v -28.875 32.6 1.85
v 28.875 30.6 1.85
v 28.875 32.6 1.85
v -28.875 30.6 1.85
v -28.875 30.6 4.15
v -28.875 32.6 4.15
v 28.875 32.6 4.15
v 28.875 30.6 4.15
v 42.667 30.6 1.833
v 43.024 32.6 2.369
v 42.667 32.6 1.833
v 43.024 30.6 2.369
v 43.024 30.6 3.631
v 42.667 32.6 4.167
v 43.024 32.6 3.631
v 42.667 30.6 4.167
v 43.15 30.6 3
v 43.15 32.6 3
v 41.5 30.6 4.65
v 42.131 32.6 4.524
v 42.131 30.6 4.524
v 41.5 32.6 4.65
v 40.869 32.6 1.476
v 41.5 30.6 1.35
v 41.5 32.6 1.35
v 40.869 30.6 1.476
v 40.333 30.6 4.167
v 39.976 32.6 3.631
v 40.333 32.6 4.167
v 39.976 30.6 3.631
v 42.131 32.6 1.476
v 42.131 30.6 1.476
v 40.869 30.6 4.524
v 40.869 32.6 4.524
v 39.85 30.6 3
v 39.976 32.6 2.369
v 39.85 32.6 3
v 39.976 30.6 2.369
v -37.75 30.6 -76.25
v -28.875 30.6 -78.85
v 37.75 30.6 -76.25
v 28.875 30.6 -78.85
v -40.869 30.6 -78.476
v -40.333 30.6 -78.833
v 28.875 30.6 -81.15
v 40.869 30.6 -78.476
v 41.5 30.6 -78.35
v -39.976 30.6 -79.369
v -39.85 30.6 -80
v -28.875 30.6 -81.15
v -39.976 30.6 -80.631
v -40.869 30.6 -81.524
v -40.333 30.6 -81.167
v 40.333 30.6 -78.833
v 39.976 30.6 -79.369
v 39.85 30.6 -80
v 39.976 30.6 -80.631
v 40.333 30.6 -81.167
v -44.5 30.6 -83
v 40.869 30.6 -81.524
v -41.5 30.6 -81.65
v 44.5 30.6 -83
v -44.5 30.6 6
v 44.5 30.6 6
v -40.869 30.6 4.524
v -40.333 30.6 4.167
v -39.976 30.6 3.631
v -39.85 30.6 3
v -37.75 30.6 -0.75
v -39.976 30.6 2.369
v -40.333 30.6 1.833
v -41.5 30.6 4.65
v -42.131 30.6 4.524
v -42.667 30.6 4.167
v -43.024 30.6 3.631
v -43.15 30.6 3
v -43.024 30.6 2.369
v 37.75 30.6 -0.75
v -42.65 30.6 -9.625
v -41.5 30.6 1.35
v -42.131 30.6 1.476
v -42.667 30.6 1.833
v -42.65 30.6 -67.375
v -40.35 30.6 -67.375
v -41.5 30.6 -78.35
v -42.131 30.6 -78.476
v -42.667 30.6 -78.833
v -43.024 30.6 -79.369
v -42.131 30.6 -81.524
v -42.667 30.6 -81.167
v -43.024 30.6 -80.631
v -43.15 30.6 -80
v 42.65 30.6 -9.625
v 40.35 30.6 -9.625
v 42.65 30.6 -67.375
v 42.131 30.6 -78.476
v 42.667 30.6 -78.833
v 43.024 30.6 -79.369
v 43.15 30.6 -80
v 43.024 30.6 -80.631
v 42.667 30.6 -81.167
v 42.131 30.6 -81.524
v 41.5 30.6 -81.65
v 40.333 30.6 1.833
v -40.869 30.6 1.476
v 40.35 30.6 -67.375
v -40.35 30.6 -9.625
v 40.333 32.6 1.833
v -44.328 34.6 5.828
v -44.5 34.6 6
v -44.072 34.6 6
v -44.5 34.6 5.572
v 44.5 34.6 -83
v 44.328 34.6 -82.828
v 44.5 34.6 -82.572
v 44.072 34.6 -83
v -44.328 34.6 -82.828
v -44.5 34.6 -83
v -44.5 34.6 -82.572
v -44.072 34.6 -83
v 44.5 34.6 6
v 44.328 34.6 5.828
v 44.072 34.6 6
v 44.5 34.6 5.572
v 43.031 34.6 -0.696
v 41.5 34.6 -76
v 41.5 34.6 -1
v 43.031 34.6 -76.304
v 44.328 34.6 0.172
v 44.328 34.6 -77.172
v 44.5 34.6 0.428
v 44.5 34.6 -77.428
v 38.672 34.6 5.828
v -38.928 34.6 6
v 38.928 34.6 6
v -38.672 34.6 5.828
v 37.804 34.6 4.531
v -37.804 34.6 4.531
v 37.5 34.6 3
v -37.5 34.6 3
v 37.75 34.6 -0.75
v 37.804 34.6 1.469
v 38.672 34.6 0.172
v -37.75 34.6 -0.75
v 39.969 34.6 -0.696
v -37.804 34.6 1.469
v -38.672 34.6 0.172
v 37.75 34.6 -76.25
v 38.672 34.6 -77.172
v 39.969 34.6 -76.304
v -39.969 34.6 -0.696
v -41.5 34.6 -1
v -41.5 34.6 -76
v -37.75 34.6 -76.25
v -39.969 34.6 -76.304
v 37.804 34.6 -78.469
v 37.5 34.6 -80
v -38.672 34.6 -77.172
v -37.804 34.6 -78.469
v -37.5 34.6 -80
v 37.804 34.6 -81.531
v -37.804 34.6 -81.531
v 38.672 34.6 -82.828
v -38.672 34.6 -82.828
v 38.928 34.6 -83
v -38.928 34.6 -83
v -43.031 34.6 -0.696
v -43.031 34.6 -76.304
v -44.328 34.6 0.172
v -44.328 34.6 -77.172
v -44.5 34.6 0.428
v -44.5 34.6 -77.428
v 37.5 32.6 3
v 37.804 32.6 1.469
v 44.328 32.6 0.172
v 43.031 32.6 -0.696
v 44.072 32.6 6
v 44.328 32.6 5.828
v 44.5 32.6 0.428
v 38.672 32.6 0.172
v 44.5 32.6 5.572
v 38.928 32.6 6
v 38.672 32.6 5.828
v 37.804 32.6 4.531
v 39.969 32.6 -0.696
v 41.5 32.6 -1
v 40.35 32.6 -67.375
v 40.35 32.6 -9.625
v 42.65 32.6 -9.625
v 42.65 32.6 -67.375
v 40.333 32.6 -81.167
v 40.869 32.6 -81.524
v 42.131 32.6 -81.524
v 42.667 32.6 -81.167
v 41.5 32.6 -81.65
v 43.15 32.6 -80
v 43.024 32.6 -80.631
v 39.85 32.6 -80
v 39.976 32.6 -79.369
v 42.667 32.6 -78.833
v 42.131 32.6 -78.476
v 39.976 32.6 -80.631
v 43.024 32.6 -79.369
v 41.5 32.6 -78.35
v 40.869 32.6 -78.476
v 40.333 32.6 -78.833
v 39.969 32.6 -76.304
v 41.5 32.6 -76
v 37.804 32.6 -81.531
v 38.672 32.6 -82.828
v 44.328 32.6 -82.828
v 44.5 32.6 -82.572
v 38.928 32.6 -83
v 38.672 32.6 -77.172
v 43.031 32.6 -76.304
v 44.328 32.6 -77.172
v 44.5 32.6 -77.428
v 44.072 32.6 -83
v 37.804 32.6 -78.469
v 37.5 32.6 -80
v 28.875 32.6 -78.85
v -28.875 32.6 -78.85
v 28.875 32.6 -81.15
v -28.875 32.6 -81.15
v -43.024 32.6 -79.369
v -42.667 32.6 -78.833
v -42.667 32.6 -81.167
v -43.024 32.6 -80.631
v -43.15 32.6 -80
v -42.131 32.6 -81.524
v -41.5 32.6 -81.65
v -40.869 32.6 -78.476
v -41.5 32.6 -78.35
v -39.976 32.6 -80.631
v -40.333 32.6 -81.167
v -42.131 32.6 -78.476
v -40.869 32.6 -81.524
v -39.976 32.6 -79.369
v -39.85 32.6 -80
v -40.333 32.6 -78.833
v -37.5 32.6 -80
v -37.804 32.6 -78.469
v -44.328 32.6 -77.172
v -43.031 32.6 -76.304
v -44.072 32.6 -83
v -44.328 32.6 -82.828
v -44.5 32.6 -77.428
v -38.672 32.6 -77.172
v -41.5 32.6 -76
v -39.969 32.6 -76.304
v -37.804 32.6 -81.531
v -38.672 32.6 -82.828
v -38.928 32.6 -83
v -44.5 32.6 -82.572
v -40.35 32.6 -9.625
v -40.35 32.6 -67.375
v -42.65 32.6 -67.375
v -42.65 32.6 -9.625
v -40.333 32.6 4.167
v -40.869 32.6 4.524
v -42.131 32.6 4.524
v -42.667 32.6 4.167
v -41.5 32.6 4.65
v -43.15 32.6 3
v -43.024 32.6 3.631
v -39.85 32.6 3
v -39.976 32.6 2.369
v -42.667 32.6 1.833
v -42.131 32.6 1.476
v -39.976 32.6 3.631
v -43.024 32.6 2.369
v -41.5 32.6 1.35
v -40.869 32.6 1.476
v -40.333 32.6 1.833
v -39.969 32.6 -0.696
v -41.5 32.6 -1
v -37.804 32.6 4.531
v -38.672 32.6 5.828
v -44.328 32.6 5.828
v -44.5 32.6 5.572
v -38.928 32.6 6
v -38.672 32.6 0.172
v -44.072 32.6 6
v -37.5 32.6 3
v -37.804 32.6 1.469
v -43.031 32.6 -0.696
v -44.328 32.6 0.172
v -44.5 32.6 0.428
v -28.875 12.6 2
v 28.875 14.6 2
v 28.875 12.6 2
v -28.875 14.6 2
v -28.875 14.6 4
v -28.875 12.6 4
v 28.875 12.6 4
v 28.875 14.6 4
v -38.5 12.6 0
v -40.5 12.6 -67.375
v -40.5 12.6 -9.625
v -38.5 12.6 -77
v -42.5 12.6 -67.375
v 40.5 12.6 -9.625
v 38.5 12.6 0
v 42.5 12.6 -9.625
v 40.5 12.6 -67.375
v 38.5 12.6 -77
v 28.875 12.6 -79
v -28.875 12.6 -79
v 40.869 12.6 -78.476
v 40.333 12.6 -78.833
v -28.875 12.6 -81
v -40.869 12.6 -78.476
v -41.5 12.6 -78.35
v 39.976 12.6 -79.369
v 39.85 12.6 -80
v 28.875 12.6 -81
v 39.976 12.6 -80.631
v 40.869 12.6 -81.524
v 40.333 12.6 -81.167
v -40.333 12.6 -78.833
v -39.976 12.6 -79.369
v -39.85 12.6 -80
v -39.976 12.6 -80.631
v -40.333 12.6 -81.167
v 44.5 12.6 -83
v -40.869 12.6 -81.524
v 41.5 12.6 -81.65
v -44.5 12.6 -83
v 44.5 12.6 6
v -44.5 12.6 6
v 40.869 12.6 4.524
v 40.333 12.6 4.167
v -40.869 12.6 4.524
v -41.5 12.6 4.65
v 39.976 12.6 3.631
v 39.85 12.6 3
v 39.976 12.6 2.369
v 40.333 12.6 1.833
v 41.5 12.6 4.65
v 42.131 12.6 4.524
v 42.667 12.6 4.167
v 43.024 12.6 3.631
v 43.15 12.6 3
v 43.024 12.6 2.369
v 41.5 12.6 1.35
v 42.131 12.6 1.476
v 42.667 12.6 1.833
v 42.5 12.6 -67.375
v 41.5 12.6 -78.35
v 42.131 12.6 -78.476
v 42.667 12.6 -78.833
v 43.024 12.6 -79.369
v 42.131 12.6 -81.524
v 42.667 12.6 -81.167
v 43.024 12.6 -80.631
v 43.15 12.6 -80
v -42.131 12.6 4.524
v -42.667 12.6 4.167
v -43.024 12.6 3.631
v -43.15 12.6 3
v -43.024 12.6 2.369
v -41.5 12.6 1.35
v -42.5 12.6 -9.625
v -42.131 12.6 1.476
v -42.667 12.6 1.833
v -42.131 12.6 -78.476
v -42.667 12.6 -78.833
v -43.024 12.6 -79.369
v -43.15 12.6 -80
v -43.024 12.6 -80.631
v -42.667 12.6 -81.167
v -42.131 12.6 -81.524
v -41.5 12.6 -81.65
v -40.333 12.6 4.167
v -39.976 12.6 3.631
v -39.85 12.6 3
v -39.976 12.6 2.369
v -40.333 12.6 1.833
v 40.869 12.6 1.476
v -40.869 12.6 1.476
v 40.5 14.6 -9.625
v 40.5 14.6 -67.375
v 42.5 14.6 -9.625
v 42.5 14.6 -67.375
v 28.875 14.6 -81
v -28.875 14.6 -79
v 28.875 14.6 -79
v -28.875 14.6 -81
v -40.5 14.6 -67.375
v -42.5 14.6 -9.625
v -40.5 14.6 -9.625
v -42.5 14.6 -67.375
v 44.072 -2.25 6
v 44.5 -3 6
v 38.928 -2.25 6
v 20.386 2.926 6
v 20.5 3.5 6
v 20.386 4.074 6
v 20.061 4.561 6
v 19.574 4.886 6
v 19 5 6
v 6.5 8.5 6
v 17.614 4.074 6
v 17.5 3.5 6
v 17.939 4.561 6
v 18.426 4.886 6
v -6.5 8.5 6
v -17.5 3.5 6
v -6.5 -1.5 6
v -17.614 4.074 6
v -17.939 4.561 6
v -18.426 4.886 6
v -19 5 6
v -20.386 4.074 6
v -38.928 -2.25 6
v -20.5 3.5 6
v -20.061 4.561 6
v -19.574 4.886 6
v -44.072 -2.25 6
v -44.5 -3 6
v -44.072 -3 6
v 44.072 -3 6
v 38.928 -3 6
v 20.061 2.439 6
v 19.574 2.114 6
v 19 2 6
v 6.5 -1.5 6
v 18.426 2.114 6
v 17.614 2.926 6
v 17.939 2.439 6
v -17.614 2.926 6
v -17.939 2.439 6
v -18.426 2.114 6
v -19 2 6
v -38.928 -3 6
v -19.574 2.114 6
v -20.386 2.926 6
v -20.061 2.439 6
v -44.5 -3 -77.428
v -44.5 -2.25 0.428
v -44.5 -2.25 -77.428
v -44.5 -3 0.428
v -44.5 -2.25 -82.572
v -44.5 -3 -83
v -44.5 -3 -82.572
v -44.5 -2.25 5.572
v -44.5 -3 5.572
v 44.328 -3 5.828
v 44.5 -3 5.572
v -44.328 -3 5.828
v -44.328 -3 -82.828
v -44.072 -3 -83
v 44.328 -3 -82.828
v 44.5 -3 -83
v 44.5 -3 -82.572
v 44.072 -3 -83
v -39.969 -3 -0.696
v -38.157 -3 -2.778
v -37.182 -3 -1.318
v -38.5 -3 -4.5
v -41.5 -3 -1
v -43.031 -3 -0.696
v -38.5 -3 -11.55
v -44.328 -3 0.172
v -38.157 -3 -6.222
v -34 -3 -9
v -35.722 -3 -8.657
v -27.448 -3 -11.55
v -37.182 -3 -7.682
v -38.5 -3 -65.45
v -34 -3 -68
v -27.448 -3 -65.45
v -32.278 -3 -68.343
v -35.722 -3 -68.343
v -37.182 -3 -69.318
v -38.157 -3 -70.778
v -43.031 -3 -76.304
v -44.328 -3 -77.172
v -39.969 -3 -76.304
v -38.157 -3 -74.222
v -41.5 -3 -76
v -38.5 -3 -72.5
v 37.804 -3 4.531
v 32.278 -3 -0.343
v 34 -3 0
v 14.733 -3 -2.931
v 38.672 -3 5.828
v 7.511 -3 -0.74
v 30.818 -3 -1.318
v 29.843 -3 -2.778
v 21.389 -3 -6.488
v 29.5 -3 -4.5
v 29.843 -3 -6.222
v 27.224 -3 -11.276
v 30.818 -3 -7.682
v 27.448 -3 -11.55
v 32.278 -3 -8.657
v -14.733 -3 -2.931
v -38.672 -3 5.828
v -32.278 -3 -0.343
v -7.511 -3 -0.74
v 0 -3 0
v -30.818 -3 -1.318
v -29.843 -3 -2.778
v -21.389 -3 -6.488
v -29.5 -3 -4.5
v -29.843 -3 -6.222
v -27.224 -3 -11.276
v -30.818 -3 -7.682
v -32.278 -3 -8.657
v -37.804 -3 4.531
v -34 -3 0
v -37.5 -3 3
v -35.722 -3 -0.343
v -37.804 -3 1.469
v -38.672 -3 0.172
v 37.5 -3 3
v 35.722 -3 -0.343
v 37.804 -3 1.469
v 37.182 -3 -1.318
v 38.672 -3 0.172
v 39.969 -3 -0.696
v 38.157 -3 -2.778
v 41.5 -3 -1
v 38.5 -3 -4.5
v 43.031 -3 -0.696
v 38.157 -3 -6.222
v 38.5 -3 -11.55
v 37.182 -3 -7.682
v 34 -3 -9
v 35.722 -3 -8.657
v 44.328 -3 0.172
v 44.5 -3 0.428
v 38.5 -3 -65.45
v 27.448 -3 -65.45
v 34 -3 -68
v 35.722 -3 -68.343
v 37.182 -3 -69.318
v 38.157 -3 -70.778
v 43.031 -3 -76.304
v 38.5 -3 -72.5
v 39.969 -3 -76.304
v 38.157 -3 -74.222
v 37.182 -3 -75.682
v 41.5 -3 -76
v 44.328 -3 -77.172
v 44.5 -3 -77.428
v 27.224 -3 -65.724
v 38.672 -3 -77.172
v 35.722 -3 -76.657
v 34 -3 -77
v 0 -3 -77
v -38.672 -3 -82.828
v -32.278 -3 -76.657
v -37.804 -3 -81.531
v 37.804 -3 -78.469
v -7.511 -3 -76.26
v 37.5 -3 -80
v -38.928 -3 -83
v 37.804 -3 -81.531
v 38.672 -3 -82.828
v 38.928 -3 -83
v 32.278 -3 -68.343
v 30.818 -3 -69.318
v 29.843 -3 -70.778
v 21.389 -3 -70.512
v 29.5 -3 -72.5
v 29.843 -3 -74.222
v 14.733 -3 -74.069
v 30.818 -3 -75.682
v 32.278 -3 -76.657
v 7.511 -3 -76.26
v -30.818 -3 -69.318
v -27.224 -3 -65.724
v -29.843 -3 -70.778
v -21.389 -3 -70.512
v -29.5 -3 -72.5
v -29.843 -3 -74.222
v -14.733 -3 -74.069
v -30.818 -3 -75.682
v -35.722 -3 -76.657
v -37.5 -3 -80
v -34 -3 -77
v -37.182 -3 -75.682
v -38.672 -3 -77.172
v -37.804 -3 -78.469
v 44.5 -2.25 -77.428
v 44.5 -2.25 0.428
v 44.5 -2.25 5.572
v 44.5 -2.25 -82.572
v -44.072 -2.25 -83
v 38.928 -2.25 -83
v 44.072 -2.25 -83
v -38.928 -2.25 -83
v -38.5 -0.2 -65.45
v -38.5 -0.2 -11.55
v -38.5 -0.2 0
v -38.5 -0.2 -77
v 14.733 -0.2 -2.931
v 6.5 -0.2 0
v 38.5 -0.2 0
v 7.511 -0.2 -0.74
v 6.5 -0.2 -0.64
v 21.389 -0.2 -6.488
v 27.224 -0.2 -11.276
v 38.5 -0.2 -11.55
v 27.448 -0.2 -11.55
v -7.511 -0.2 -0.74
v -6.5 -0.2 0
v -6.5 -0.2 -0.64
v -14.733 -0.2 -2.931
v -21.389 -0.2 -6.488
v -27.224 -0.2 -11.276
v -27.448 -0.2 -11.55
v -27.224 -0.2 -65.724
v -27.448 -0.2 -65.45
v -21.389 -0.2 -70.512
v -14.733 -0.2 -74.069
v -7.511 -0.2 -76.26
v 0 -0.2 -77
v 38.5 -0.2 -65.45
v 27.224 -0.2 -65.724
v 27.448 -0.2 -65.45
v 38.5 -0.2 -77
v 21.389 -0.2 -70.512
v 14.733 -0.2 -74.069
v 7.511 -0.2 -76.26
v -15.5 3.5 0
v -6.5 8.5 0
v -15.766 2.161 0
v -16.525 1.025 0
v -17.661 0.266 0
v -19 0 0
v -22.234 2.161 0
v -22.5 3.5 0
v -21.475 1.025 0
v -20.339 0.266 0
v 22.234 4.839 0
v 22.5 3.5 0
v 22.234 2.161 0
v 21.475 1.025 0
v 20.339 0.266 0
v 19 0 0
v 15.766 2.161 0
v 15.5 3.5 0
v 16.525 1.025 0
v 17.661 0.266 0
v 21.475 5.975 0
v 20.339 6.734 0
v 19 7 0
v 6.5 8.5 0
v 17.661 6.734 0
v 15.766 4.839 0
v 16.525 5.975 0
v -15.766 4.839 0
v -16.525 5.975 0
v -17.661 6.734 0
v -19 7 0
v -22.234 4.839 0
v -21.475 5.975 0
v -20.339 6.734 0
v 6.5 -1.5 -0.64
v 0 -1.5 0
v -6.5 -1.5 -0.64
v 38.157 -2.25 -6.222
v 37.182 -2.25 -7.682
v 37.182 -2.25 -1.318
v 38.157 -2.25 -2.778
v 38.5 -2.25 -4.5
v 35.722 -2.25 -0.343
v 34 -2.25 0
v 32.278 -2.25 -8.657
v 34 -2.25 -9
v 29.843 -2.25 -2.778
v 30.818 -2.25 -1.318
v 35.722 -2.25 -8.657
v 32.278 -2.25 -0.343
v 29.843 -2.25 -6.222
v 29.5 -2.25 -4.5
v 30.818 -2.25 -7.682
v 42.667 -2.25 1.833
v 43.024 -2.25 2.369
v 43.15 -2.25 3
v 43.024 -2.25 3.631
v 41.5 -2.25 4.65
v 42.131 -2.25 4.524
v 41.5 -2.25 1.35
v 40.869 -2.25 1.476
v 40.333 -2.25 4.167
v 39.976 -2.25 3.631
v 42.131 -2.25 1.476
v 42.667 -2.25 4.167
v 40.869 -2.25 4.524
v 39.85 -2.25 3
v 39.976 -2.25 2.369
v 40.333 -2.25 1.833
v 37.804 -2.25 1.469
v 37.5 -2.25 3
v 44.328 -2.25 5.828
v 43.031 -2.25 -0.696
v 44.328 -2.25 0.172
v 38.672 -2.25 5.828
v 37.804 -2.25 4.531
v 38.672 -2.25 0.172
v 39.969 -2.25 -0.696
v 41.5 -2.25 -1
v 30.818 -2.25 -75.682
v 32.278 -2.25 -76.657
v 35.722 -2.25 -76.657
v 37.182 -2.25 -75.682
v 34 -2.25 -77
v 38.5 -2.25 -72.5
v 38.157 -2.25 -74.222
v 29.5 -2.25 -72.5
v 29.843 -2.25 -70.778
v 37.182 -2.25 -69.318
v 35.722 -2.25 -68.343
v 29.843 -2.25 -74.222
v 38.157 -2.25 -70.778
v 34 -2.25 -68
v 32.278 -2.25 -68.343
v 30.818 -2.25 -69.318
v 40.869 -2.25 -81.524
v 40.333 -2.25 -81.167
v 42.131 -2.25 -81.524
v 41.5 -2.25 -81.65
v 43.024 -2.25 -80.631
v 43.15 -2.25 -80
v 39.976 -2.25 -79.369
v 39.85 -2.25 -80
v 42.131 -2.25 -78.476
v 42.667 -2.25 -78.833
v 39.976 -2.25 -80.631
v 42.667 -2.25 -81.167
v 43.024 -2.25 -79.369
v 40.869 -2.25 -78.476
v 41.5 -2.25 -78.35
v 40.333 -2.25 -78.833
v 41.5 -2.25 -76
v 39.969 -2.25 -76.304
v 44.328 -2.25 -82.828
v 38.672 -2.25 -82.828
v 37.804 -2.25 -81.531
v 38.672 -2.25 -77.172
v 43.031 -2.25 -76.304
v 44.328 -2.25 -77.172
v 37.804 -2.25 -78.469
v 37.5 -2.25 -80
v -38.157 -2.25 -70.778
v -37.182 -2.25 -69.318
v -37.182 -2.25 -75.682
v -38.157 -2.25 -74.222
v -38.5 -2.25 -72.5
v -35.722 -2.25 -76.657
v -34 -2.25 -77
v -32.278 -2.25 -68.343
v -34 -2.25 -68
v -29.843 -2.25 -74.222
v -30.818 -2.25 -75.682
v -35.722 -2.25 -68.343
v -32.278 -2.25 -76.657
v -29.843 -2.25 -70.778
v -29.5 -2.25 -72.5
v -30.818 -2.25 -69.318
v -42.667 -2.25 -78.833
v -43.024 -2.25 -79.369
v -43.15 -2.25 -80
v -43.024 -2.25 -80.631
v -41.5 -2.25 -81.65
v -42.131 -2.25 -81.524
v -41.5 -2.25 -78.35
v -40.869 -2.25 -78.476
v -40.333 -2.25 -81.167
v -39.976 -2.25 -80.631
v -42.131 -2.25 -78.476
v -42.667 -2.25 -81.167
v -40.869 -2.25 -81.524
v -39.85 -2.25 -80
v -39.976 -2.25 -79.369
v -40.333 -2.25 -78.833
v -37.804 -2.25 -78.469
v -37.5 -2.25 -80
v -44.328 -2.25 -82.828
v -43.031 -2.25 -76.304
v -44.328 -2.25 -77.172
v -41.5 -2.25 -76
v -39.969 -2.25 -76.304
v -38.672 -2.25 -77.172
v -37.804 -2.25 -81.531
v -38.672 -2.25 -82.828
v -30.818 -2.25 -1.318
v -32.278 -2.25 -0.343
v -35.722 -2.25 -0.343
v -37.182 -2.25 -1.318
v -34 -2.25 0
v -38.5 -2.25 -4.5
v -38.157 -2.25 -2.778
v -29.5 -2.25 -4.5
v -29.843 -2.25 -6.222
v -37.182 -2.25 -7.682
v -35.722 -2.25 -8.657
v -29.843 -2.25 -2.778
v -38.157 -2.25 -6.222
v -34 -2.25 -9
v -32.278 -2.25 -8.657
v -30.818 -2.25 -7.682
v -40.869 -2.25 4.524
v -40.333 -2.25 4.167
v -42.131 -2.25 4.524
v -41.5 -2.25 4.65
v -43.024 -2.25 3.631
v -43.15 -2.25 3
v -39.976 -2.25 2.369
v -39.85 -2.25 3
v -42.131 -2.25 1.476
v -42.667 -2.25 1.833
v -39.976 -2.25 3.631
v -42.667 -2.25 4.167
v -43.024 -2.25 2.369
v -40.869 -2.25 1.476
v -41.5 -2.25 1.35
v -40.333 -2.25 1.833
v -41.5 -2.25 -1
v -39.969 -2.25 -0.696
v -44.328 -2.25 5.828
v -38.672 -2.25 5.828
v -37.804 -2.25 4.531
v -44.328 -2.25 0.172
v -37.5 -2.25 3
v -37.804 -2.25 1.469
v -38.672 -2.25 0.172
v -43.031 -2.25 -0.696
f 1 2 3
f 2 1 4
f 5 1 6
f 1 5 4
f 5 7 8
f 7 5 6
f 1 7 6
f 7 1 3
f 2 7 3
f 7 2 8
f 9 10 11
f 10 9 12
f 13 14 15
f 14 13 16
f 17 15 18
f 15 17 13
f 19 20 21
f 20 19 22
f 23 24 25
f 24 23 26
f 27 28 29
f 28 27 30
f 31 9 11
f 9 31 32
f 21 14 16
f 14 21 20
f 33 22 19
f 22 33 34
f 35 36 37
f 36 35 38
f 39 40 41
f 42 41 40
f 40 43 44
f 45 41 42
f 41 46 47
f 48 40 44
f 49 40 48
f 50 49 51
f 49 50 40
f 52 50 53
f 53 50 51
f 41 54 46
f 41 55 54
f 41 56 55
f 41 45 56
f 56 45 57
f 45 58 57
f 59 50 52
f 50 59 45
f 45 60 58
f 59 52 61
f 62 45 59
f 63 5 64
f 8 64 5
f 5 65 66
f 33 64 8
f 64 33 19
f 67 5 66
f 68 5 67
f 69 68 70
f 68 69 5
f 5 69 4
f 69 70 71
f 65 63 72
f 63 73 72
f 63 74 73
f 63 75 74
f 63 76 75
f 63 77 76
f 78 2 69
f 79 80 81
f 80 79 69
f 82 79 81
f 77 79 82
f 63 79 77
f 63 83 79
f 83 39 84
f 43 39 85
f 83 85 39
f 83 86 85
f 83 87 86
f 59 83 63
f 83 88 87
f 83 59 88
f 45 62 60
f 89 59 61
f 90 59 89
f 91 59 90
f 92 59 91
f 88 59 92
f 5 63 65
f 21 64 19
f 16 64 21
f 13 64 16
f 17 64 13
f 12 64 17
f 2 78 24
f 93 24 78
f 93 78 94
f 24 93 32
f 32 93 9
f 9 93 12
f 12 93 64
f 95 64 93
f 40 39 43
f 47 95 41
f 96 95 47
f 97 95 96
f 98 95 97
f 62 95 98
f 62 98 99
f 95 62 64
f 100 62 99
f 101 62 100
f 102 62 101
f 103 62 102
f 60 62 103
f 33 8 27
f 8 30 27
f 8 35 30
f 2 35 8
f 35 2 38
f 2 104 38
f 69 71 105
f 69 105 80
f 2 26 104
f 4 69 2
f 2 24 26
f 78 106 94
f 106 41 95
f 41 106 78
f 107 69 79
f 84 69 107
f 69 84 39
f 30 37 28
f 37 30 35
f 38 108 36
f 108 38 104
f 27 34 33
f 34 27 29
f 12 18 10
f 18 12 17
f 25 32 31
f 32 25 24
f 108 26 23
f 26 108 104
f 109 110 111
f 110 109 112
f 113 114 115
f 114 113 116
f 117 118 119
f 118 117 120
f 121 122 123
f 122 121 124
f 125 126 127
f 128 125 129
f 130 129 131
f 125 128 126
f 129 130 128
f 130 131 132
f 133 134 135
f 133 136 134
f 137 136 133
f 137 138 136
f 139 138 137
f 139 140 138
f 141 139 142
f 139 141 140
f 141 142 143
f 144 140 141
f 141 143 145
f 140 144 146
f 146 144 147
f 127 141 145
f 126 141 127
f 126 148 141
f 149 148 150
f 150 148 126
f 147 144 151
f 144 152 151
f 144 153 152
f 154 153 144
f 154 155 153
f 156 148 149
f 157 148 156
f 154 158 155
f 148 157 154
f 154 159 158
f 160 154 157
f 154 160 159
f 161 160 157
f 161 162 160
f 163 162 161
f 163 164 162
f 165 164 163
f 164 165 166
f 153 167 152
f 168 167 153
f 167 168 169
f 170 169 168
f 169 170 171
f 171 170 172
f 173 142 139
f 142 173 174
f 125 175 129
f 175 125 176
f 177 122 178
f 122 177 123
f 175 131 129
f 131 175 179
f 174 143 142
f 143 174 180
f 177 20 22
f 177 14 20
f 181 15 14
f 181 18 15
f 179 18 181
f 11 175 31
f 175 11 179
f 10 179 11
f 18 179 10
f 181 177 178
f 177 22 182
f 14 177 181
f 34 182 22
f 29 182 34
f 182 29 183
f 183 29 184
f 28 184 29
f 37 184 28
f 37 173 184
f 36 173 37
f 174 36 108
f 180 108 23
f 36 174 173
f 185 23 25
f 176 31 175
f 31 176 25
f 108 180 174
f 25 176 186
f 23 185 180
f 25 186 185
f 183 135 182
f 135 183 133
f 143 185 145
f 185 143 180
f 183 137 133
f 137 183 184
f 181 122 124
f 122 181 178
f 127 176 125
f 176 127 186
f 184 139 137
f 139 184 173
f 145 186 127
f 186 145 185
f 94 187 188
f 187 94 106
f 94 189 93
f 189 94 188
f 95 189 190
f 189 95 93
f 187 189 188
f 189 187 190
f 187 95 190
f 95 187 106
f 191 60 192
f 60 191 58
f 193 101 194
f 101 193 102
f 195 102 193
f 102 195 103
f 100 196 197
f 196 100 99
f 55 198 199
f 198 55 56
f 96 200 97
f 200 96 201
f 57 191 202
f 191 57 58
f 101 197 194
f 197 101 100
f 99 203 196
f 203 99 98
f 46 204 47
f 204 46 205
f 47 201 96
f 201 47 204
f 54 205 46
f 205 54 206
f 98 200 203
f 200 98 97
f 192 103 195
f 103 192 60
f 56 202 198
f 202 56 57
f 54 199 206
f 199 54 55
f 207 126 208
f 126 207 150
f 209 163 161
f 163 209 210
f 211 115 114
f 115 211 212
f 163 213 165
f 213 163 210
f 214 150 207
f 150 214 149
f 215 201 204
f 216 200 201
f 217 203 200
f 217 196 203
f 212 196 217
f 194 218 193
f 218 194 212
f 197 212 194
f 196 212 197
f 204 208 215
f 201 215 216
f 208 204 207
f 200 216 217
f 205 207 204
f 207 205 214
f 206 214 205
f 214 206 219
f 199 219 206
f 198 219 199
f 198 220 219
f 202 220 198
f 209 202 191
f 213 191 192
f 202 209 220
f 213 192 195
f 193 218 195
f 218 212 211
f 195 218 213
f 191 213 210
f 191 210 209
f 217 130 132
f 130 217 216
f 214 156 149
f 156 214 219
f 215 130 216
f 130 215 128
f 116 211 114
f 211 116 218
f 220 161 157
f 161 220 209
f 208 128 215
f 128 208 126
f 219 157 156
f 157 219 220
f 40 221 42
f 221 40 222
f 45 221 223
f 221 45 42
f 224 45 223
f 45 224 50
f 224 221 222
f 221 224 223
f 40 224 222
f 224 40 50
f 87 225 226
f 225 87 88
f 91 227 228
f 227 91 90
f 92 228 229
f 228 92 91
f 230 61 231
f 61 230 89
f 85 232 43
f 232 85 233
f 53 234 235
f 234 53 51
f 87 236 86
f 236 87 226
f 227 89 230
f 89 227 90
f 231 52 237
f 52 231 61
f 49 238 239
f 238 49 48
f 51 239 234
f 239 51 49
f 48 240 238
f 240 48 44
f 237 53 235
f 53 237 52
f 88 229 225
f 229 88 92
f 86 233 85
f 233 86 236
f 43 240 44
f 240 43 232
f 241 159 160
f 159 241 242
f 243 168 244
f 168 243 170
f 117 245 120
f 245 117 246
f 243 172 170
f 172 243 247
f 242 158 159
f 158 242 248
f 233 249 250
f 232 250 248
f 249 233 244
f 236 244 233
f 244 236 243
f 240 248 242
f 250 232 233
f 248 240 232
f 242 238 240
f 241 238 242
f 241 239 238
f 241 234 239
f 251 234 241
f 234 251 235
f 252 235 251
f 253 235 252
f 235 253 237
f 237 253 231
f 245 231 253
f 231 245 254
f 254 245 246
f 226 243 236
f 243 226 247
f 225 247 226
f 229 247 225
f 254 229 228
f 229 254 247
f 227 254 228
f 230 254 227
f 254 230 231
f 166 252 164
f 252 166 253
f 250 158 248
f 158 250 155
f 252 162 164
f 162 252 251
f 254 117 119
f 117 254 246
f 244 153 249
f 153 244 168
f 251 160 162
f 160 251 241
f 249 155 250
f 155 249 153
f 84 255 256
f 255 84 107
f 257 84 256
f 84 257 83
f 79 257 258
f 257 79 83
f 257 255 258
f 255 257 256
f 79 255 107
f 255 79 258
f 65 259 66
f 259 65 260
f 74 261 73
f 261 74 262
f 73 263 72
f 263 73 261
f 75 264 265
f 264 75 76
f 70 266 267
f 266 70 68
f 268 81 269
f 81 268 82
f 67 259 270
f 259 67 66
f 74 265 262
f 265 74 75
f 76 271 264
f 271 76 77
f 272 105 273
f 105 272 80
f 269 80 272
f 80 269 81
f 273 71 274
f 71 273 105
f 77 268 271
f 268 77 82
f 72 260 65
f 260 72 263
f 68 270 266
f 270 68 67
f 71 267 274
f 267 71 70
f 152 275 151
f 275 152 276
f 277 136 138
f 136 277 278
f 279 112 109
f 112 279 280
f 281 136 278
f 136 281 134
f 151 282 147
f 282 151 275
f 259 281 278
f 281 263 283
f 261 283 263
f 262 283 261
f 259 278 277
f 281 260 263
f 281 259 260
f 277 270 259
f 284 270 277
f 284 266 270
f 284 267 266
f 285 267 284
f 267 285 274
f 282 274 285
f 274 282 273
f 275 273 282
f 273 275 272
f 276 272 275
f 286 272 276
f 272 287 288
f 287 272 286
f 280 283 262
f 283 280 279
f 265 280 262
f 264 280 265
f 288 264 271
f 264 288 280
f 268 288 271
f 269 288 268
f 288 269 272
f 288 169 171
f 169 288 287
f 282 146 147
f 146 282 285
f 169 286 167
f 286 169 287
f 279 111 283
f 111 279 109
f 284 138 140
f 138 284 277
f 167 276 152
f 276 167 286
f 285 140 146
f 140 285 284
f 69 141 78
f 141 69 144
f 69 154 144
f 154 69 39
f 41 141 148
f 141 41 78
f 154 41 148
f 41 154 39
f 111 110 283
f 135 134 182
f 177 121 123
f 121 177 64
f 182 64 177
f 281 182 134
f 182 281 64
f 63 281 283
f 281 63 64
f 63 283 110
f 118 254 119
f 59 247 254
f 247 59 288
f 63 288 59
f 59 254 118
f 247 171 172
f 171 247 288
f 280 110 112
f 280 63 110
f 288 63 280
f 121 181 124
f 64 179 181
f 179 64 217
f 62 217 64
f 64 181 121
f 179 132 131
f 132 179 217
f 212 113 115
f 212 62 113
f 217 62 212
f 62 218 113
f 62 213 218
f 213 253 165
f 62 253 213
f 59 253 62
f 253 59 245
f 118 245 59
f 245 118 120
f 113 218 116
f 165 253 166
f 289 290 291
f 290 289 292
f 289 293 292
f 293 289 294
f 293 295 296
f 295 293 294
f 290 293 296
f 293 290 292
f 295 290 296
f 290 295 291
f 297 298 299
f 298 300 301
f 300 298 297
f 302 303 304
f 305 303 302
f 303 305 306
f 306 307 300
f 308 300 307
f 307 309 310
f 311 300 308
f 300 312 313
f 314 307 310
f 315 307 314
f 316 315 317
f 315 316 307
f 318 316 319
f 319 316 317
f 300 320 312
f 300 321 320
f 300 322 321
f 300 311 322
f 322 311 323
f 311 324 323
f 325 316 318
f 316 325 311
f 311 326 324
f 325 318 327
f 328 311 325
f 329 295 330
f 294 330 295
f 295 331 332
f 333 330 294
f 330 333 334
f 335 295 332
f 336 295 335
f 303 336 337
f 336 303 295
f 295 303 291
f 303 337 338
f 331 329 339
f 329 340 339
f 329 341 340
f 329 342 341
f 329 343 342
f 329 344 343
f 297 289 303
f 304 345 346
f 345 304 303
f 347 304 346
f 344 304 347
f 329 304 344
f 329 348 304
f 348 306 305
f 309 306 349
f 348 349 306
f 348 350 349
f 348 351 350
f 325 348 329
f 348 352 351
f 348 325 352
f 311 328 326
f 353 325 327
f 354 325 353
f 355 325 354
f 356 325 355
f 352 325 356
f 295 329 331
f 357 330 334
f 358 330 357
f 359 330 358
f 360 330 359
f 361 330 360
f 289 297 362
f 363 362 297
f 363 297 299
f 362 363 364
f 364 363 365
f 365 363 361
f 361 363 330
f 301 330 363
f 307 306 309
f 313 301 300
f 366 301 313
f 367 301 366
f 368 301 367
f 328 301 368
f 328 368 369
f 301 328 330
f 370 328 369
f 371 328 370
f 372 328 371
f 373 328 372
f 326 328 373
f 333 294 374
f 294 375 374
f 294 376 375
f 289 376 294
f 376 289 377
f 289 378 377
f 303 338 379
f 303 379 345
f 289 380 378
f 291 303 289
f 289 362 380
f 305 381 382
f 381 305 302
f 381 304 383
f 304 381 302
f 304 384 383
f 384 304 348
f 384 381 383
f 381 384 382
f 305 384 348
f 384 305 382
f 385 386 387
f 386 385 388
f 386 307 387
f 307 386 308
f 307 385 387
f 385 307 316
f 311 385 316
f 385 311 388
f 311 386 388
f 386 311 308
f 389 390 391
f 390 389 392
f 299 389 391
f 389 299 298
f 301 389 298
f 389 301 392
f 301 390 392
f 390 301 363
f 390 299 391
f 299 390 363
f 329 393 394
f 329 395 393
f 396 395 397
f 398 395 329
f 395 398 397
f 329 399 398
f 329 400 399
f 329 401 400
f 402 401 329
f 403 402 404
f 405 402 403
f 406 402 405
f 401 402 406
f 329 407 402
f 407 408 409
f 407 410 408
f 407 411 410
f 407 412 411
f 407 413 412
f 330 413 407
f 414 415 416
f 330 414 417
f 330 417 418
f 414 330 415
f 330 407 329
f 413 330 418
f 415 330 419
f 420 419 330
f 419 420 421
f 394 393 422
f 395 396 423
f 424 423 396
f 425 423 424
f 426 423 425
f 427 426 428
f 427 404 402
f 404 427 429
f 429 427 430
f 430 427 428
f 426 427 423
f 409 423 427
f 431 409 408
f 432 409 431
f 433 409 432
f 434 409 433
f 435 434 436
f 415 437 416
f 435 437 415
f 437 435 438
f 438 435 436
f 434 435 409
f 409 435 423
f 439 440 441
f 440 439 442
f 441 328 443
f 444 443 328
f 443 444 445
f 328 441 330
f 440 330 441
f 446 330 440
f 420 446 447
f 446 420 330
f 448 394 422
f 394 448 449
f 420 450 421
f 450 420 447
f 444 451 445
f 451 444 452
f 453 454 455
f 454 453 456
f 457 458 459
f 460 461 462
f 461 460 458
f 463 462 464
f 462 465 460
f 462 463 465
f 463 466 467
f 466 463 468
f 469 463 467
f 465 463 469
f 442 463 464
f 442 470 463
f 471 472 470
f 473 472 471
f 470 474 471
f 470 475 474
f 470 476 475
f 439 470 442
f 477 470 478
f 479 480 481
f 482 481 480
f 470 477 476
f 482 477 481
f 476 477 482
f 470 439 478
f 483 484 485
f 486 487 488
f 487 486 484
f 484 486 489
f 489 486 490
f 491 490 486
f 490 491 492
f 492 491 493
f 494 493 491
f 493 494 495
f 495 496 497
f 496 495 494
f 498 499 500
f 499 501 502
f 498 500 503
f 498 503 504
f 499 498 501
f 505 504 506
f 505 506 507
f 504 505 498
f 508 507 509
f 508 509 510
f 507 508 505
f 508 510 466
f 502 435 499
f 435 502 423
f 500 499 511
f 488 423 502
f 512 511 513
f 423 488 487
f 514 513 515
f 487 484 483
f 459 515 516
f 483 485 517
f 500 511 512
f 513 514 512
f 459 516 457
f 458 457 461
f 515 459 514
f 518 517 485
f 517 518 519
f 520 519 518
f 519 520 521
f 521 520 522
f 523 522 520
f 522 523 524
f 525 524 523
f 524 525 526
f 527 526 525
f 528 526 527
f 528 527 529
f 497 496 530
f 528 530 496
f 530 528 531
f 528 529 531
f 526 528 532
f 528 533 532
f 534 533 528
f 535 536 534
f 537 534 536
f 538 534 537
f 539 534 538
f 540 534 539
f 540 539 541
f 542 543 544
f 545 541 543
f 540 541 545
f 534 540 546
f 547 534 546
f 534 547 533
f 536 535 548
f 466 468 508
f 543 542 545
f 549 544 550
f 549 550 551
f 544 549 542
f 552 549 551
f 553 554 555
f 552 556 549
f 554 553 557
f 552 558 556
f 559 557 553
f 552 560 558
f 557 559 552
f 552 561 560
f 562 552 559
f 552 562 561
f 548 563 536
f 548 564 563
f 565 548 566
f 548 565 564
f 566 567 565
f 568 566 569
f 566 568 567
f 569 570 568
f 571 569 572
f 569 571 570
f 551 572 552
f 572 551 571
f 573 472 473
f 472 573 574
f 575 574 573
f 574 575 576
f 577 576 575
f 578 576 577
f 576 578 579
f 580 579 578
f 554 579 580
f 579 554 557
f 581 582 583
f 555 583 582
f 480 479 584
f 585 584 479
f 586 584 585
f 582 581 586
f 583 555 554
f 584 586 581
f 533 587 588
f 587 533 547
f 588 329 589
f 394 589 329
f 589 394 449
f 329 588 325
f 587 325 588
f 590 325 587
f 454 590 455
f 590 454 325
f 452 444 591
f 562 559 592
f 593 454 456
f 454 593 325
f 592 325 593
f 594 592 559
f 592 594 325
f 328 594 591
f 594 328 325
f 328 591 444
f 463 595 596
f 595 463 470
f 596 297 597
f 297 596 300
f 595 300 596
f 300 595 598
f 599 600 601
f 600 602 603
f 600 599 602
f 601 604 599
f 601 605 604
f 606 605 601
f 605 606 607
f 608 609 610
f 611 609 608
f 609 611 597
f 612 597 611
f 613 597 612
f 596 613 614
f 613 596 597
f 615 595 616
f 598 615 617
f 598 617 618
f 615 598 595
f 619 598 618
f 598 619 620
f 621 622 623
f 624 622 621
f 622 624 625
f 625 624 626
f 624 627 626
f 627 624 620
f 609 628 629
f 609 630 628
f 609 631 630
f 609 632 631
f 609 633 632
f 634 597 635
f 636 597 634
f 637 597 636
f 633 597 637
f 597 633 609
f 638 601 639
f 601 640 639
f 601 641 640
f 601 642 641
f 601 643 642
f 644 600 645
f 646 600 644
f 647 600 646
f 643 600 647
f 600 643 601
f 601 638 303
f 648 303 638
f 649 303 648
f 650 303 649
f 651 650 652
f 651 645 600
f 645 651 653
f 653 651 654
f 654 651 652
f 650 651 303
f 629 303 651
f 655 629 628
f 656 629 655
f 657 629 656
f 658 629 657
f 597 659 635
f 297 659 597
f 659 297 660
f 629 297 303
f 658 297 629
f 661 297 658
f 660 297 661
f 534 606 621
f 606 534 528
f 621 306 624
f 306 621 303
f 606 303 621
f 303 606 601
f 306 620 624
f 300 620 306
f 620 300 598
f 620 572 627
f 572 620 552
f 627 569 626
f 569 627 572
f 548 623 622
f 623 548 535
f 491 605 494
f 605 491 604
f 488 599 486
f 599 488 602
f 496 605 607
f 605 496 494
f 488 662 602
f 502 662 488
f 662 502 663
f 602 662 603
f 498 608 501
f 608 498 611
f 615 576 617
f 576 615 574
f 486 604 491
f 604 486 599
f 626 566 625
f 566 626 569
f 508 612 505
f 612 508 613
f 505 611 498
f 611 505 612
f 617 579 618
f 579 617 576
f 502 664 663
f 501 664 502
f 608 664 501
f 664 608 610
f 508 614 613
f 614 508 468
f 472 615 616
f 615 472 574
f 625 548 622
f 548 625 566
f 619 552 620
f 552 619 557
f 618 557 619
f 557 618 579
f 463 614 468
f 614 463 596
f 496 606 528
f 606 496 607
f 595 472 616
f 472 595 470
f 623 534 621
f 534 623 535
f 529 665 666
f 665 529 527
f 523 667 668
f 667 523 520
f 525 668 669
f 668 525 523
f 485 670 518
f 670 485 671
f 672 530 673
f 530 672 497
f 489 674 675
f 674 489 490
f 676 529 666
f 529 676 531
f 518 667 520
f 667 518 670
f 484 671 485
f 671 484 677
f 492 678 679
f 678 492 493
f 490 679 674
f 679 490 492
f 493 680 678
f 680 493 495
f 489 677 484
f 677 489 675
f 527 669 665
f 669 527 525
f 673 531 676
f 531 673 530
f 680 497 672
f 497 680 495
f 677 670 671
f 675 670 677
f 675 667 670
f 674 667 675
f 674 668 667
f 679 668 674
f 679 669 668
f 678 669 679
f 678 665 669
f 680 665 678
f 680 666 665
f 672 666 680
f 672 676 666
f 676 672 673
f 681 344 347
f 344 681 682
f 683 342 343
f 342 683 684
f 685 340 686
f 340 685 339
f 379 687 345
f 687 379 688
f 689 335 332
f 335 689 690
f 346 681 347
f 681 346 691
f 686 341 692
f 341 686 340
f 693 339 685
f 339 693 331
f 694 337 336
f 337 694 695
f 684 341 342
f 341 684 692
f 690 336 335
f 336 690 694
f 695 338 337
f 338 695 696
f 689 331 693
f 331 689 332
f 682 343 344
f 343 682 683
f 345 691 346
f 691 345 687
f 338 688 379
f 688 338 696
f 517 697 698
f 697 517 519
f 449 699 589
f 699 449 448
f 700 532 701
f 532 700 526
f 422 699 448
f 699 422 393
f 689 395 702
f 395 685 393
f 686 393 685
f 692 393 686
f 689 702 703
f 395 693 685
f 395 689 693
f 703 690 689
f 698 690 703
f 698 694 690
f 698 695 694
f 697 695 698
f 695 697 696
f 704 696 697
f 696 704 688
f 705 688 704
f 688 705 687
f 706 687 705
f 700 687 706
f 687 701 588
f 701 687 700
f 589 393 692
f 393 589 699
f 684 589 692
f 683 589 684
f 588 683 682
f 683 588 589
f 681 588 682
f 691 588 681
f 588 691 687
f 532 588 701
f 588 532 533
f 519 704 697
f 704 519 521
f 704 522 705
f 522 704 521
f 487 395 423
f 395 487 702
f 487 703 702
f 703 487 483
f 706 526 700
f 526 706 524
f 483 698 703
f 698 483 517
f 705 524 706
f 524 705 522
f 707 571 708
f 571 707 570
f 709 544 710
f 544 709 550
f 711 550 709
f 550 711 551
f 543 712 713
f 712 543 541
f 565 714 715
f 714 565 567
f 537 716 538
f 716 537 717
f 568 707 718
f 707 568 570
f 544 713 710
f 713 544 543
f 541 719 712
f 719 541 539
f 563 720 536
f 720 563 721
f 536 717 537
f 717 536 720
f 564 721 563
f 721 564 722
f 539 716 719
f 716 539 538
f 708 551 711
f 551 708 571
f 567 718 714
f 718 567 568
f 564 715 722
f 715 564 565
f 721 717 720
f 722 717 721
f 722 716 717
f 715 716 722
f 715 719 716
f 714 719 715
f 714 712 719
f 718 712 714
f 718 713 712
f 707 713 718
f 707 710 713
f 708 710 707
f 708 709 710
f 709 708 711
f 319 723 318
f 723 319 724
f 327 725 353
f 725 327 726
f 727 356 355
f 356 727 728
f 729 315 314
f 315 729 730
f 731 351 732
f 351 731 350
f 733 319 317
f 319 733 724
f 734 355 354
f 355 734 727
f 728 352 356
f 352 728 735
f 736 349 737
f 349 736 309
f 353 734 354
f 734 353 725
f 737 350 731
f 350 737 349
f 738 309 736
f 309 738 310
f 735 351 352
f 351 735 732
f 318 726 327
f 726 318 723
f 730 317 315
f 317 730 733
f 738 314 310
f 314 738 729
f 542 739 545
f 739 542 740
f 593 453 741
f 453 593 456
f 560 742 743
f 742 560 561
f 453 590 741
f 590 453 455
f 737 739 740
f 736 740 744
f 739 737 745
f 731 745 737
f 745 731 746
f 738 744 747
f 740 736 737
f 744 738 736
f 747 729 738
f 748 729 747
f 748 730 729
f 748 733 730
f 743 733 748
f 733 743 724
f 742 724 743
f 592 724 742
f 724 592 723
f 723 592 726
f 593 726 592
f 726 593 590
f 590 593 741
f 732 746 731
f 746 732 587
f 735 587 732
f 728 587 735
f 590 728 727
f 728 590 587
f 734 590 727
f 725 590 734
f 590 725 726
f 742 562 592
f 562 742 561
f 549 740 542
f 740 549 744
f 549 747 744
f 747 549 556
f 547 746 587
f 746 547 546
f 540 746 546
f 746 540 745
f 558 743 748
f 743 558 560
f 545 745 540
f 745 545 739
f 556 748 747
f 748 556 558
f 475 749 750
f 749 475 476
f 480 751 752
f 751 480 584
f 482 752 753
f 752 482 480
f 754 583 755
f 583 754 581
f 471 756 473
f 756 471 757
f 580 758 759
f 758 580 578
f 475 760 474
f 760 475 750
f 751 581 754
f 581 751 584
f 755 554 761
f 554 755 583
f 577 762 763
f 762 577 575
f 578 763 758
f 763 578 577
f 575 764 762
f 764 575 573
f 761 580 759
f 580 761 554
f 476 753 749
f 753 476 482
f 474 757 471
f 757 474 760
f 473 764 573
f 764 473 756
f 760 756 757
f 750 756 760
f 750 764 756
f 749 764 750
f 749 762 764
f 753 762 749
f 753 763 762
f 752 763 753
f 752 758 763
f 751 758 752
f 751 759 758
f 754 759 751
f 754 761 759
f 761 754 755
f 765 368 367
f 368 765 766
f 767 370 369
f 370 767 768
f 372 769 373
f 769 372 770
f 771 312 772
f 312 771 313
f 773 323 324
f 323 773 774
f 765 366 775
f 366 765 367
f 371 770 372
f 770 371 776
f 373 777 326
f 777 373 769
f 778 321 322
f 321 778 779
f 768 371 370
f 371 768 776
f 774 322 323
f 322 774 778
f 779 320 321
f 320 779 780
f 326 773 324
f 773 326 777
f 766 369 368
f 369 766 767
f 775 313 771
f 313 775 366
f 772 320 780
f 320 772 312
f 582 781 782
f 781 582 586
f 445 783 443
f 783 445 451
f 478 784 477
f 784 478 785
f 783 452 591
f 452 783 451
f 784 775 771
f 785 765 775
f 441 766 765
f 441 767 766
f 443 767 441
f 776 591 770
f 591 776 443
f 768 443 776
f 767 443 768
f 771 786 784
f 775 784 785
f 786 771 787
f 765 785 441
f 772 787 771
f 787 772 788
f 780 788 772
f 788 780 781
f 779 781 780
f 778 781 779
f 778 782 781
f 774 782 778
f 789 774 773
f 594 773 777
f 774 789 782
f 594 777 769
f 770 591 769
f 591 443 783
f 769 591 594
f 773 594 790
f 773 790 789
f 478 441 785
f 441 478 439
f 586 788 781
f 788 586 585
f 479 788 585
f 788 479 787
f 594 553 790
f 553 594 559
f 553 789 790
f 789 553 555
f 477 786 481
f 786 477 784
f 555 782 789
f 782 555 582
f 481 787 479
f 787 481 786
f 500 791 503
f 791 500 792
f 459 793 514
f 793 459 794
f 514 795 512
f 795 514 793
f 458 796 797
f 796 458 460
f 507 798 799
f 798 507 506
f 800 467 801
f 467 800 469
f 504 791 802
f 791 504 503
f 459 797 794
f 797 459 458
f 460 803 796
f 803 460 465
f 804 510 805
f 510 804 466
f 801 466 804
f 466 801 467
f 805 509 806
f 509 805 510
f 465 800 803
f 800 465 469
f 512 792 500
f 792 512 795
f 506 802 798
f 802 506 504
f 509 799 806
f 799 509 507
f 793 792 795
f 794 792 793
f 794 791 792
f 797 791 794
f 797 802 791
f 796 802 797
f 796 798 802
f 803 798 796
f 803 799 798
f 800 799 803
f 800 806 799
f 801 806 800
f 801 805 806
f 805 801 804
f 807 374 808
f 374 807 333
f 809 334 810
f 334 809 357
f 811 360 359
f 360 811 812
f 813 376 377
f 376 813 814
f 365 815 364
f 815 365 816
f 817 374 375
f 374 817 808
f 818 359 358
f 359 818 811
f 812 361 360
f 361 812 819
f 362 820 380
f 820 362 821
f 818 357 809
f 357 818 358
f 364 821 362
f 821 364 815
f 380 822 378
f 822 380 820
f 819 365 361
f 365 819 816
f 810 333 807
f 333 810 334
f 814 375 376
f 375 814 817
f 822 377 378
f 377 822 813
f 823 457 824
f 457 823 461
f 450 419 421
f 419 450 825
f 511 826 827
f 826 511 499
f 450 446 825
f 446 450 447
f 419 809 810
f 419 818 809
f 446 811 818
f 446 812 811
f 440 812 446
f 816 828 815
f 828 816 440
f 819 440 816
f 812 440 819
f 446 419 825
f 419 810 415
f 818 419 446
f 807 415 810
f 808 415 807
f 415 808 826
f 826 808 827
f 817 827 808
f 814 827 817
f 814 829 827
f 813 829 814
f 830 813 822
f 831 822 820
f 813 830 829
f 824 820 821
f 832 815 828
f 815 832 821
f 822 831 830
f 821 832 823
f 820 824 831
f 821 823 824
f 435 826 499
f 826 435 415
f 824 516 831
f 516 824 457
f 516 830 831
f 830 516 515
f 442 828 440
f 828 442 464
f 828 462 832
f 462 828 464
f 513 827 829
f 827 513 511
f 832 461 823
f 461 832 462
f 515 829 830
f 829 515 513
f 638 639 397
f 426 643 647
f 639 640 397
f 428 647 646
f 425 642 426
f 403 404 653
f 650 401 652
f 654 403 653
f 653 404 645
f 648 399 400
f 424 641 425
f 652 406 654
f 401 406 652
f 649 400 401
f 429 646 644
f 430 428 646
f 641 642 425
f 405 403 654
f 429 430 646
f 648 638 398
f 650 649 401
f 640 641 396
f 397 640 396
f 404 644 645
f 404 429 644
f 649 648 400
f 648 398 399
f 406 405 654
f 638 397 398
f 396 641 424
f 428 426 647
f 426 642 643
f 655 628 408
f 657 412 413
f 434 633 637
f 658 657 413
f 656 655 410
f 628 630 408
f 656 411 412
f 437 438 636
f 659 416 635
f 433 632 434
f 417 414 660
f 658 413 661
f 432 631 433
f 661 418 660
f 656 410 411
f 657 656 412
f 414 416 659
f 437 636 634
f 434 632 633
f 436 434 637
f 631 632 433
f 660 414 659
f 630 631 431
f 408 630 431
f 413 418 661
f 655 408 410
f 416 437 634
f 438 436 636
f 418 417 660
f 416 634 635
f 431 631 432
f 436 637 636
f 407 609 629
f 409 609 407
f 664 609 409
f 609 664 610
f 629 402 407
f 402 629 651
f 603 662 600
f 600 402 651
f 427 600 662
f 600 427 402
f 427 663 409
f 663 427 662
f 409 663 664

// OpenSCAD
width_box = 77;
length_box = 77;
tickness = 6;
height_box = 12.6;
buttons_diam = 7;
base_tickness = 3;
slot_diam = 9;
guides = 2;
guides_gap = 0.3;
cap_tickness = 4;
screw_diam = 3.3;
bolt_head_diam = 8;

module rotate_about_pt(z, y, pt) {
    translate(pt)
        rotate([0, y, z])
            translate(-pt)
                children();   
}

translate([0, height_box+20, 0]) {
    difference () {
        translate([0, 0, -(width_box)/2]) {
            rotate([90,0,0]) {
                linear_extrude(height = cap_tickness, center = true, convexity = 10, twist = 0, slices = 20, scale = 1.0, $fn = 16) {
                    square(size = [width_box+2*tickness, length_box+2*tickness], center = true);
                }
            }
        }
        union() {
            translate([0,0, -(width_box)/2]) {
                rotate([90,0,0]) {
                    linear_extrude(height = cap_tickness, center = true, convexity = 10, twist = 0, slices = 20, scale = 1.0, $fn = 16) {
                        square(size = [width_box-1.5, length_box-1.5], center = true);
                    }
                }
            }
            for(rot = [0,90,180,270]) {
                rotate_about_pt(0, rot, [0, 0, - width_box/2]) {
                    translate([0, -(guides+guides_gap)/2, tickness/2]) {
                        linear_extrude(height = guides+guides_gap, center = true, convexity = 10, twist = 0, slices = 20, scale = 1.0, $fn = 16) {
                            square(size = [width_box *(3/4), guides+guides_gap], center = true);
                        }
                    }
                    /* vite */
                    translate([width_box/2+tickness/2, 0, tickness/2]) {
                        rotate([90,0,0]) {
                            cylinder(h=cap_tickness, r=screw_diam/2, center =true, $fn=16);
                        }
                    }
                    /* dado */
                    translate([width_box/2+tickness/2, cap_tickness/4, tickness/2]) {
                        rotate([90,0,0]) {
                            cylinder(h=cap_tickness/2, d=bolt_head_diam, center = true, $fn=16);
                        }
                    }
                }
            }
        }
    }
}

difference() {
    union () {
        translate([0,(height_box)/2-base_tickness/2, -(width_box)/2]) {
            rotate([90,0,0]) {
                linear_extrude(height = height_box+base_tickness, center = true, convexity = 10, twist = 0, slices = 20, scale = 1.0, $fn = 16) {
                    square(size = [width_box+2*tickness, length_box+2*tickness], center = true);
                }
            }
        }
        for(rot = [0,90,180,270]) {
            rotate_about_pt(0, rot, [0, 0, - width_box/2]) {
                translate([0,(height_box)+guides/2, tickness/2]) {
                    linear_extrude(height = guides, center = true, convexity = 10, twist = 0, slices = 20, scale = 1.0, $fn = 16) {
                        square(size = [width_box *(3/4), guides], center = true);
                    }
                }
                

            }
        }
    }
    union() {
        translate([0, height_box/2, -width_box/2]) {
            rotate([90,0,0]) {
               union() {
                    linear_extrude(height = height_box+0.4, center = true, convexity = 10, twist = 0, slices = 20, scale = 1.0, $fn = 16) {
                        square(size = [width_box, length_box], center = true);
                    }
                    /* circular hole to save filament */
                    cylinder(h = height_box*2, r1 = width_box/2, r2 = width_box/2, center = true, $fn=32);
                    cube([width_box, length_box*0.7, height_box*2], center = true);
                }
            }
        }
        translate([19, buttons_diam/2, 0]){
            cylinder(h = tickness, r1 = buttons_diam/2, r2 = 3/2, center = false, $fn=16);
        }
        translate([-19,buttons_diam/2,0]){
            cylinder(h = tickness, r1 = buttons_diam/2, r2 = 3/2, center = false, $fn=16);
        }
        translate([0,buttons_diam/2,tickness/2]){
            linear_extrude(height = tickness*2, center = true, convexity = 10, twist = 0, slices = 20, scale = 1.0, $fn = 16) {
                square(size = [13, buttons_diam+3], center = true);
            }
        }
        
        
        for(rot = [0,90,180,270]) {
            rotate_about_pt(0, rot, [0, 0, - width_box/2]) {
                
                /* supporto piedi */
                translate([width_box/2-slot_diam/2, -base_tickness, -slot_diam/2]) {
                    rotate([90,0,0]) {
                        cylinder(h=base_tickness/2, d=slot_diam, center =true, $fn=16);
                    }
                }
                /* viti */
                translate([width_box/2+tickness/2, height_box/2-base_tickness/2, tickness/2]) {
                    rotate([90,0,0]) {
                        cylinder(h=height_box+base_tickness, r=screw_diam/2, center =true, $fn=16);
                    }
                }
                
                /* dado */
                translate([width_box/2+tickness/2, -base_tickness, tickness/2]) {
                    rotate([90,0,0]) {
                        cylinder(h=base_tickness/2, d=bolt_head_diam, center = true, $fn=16);
                    }
                }
                
            }
        }
        
        
    }
}

       
